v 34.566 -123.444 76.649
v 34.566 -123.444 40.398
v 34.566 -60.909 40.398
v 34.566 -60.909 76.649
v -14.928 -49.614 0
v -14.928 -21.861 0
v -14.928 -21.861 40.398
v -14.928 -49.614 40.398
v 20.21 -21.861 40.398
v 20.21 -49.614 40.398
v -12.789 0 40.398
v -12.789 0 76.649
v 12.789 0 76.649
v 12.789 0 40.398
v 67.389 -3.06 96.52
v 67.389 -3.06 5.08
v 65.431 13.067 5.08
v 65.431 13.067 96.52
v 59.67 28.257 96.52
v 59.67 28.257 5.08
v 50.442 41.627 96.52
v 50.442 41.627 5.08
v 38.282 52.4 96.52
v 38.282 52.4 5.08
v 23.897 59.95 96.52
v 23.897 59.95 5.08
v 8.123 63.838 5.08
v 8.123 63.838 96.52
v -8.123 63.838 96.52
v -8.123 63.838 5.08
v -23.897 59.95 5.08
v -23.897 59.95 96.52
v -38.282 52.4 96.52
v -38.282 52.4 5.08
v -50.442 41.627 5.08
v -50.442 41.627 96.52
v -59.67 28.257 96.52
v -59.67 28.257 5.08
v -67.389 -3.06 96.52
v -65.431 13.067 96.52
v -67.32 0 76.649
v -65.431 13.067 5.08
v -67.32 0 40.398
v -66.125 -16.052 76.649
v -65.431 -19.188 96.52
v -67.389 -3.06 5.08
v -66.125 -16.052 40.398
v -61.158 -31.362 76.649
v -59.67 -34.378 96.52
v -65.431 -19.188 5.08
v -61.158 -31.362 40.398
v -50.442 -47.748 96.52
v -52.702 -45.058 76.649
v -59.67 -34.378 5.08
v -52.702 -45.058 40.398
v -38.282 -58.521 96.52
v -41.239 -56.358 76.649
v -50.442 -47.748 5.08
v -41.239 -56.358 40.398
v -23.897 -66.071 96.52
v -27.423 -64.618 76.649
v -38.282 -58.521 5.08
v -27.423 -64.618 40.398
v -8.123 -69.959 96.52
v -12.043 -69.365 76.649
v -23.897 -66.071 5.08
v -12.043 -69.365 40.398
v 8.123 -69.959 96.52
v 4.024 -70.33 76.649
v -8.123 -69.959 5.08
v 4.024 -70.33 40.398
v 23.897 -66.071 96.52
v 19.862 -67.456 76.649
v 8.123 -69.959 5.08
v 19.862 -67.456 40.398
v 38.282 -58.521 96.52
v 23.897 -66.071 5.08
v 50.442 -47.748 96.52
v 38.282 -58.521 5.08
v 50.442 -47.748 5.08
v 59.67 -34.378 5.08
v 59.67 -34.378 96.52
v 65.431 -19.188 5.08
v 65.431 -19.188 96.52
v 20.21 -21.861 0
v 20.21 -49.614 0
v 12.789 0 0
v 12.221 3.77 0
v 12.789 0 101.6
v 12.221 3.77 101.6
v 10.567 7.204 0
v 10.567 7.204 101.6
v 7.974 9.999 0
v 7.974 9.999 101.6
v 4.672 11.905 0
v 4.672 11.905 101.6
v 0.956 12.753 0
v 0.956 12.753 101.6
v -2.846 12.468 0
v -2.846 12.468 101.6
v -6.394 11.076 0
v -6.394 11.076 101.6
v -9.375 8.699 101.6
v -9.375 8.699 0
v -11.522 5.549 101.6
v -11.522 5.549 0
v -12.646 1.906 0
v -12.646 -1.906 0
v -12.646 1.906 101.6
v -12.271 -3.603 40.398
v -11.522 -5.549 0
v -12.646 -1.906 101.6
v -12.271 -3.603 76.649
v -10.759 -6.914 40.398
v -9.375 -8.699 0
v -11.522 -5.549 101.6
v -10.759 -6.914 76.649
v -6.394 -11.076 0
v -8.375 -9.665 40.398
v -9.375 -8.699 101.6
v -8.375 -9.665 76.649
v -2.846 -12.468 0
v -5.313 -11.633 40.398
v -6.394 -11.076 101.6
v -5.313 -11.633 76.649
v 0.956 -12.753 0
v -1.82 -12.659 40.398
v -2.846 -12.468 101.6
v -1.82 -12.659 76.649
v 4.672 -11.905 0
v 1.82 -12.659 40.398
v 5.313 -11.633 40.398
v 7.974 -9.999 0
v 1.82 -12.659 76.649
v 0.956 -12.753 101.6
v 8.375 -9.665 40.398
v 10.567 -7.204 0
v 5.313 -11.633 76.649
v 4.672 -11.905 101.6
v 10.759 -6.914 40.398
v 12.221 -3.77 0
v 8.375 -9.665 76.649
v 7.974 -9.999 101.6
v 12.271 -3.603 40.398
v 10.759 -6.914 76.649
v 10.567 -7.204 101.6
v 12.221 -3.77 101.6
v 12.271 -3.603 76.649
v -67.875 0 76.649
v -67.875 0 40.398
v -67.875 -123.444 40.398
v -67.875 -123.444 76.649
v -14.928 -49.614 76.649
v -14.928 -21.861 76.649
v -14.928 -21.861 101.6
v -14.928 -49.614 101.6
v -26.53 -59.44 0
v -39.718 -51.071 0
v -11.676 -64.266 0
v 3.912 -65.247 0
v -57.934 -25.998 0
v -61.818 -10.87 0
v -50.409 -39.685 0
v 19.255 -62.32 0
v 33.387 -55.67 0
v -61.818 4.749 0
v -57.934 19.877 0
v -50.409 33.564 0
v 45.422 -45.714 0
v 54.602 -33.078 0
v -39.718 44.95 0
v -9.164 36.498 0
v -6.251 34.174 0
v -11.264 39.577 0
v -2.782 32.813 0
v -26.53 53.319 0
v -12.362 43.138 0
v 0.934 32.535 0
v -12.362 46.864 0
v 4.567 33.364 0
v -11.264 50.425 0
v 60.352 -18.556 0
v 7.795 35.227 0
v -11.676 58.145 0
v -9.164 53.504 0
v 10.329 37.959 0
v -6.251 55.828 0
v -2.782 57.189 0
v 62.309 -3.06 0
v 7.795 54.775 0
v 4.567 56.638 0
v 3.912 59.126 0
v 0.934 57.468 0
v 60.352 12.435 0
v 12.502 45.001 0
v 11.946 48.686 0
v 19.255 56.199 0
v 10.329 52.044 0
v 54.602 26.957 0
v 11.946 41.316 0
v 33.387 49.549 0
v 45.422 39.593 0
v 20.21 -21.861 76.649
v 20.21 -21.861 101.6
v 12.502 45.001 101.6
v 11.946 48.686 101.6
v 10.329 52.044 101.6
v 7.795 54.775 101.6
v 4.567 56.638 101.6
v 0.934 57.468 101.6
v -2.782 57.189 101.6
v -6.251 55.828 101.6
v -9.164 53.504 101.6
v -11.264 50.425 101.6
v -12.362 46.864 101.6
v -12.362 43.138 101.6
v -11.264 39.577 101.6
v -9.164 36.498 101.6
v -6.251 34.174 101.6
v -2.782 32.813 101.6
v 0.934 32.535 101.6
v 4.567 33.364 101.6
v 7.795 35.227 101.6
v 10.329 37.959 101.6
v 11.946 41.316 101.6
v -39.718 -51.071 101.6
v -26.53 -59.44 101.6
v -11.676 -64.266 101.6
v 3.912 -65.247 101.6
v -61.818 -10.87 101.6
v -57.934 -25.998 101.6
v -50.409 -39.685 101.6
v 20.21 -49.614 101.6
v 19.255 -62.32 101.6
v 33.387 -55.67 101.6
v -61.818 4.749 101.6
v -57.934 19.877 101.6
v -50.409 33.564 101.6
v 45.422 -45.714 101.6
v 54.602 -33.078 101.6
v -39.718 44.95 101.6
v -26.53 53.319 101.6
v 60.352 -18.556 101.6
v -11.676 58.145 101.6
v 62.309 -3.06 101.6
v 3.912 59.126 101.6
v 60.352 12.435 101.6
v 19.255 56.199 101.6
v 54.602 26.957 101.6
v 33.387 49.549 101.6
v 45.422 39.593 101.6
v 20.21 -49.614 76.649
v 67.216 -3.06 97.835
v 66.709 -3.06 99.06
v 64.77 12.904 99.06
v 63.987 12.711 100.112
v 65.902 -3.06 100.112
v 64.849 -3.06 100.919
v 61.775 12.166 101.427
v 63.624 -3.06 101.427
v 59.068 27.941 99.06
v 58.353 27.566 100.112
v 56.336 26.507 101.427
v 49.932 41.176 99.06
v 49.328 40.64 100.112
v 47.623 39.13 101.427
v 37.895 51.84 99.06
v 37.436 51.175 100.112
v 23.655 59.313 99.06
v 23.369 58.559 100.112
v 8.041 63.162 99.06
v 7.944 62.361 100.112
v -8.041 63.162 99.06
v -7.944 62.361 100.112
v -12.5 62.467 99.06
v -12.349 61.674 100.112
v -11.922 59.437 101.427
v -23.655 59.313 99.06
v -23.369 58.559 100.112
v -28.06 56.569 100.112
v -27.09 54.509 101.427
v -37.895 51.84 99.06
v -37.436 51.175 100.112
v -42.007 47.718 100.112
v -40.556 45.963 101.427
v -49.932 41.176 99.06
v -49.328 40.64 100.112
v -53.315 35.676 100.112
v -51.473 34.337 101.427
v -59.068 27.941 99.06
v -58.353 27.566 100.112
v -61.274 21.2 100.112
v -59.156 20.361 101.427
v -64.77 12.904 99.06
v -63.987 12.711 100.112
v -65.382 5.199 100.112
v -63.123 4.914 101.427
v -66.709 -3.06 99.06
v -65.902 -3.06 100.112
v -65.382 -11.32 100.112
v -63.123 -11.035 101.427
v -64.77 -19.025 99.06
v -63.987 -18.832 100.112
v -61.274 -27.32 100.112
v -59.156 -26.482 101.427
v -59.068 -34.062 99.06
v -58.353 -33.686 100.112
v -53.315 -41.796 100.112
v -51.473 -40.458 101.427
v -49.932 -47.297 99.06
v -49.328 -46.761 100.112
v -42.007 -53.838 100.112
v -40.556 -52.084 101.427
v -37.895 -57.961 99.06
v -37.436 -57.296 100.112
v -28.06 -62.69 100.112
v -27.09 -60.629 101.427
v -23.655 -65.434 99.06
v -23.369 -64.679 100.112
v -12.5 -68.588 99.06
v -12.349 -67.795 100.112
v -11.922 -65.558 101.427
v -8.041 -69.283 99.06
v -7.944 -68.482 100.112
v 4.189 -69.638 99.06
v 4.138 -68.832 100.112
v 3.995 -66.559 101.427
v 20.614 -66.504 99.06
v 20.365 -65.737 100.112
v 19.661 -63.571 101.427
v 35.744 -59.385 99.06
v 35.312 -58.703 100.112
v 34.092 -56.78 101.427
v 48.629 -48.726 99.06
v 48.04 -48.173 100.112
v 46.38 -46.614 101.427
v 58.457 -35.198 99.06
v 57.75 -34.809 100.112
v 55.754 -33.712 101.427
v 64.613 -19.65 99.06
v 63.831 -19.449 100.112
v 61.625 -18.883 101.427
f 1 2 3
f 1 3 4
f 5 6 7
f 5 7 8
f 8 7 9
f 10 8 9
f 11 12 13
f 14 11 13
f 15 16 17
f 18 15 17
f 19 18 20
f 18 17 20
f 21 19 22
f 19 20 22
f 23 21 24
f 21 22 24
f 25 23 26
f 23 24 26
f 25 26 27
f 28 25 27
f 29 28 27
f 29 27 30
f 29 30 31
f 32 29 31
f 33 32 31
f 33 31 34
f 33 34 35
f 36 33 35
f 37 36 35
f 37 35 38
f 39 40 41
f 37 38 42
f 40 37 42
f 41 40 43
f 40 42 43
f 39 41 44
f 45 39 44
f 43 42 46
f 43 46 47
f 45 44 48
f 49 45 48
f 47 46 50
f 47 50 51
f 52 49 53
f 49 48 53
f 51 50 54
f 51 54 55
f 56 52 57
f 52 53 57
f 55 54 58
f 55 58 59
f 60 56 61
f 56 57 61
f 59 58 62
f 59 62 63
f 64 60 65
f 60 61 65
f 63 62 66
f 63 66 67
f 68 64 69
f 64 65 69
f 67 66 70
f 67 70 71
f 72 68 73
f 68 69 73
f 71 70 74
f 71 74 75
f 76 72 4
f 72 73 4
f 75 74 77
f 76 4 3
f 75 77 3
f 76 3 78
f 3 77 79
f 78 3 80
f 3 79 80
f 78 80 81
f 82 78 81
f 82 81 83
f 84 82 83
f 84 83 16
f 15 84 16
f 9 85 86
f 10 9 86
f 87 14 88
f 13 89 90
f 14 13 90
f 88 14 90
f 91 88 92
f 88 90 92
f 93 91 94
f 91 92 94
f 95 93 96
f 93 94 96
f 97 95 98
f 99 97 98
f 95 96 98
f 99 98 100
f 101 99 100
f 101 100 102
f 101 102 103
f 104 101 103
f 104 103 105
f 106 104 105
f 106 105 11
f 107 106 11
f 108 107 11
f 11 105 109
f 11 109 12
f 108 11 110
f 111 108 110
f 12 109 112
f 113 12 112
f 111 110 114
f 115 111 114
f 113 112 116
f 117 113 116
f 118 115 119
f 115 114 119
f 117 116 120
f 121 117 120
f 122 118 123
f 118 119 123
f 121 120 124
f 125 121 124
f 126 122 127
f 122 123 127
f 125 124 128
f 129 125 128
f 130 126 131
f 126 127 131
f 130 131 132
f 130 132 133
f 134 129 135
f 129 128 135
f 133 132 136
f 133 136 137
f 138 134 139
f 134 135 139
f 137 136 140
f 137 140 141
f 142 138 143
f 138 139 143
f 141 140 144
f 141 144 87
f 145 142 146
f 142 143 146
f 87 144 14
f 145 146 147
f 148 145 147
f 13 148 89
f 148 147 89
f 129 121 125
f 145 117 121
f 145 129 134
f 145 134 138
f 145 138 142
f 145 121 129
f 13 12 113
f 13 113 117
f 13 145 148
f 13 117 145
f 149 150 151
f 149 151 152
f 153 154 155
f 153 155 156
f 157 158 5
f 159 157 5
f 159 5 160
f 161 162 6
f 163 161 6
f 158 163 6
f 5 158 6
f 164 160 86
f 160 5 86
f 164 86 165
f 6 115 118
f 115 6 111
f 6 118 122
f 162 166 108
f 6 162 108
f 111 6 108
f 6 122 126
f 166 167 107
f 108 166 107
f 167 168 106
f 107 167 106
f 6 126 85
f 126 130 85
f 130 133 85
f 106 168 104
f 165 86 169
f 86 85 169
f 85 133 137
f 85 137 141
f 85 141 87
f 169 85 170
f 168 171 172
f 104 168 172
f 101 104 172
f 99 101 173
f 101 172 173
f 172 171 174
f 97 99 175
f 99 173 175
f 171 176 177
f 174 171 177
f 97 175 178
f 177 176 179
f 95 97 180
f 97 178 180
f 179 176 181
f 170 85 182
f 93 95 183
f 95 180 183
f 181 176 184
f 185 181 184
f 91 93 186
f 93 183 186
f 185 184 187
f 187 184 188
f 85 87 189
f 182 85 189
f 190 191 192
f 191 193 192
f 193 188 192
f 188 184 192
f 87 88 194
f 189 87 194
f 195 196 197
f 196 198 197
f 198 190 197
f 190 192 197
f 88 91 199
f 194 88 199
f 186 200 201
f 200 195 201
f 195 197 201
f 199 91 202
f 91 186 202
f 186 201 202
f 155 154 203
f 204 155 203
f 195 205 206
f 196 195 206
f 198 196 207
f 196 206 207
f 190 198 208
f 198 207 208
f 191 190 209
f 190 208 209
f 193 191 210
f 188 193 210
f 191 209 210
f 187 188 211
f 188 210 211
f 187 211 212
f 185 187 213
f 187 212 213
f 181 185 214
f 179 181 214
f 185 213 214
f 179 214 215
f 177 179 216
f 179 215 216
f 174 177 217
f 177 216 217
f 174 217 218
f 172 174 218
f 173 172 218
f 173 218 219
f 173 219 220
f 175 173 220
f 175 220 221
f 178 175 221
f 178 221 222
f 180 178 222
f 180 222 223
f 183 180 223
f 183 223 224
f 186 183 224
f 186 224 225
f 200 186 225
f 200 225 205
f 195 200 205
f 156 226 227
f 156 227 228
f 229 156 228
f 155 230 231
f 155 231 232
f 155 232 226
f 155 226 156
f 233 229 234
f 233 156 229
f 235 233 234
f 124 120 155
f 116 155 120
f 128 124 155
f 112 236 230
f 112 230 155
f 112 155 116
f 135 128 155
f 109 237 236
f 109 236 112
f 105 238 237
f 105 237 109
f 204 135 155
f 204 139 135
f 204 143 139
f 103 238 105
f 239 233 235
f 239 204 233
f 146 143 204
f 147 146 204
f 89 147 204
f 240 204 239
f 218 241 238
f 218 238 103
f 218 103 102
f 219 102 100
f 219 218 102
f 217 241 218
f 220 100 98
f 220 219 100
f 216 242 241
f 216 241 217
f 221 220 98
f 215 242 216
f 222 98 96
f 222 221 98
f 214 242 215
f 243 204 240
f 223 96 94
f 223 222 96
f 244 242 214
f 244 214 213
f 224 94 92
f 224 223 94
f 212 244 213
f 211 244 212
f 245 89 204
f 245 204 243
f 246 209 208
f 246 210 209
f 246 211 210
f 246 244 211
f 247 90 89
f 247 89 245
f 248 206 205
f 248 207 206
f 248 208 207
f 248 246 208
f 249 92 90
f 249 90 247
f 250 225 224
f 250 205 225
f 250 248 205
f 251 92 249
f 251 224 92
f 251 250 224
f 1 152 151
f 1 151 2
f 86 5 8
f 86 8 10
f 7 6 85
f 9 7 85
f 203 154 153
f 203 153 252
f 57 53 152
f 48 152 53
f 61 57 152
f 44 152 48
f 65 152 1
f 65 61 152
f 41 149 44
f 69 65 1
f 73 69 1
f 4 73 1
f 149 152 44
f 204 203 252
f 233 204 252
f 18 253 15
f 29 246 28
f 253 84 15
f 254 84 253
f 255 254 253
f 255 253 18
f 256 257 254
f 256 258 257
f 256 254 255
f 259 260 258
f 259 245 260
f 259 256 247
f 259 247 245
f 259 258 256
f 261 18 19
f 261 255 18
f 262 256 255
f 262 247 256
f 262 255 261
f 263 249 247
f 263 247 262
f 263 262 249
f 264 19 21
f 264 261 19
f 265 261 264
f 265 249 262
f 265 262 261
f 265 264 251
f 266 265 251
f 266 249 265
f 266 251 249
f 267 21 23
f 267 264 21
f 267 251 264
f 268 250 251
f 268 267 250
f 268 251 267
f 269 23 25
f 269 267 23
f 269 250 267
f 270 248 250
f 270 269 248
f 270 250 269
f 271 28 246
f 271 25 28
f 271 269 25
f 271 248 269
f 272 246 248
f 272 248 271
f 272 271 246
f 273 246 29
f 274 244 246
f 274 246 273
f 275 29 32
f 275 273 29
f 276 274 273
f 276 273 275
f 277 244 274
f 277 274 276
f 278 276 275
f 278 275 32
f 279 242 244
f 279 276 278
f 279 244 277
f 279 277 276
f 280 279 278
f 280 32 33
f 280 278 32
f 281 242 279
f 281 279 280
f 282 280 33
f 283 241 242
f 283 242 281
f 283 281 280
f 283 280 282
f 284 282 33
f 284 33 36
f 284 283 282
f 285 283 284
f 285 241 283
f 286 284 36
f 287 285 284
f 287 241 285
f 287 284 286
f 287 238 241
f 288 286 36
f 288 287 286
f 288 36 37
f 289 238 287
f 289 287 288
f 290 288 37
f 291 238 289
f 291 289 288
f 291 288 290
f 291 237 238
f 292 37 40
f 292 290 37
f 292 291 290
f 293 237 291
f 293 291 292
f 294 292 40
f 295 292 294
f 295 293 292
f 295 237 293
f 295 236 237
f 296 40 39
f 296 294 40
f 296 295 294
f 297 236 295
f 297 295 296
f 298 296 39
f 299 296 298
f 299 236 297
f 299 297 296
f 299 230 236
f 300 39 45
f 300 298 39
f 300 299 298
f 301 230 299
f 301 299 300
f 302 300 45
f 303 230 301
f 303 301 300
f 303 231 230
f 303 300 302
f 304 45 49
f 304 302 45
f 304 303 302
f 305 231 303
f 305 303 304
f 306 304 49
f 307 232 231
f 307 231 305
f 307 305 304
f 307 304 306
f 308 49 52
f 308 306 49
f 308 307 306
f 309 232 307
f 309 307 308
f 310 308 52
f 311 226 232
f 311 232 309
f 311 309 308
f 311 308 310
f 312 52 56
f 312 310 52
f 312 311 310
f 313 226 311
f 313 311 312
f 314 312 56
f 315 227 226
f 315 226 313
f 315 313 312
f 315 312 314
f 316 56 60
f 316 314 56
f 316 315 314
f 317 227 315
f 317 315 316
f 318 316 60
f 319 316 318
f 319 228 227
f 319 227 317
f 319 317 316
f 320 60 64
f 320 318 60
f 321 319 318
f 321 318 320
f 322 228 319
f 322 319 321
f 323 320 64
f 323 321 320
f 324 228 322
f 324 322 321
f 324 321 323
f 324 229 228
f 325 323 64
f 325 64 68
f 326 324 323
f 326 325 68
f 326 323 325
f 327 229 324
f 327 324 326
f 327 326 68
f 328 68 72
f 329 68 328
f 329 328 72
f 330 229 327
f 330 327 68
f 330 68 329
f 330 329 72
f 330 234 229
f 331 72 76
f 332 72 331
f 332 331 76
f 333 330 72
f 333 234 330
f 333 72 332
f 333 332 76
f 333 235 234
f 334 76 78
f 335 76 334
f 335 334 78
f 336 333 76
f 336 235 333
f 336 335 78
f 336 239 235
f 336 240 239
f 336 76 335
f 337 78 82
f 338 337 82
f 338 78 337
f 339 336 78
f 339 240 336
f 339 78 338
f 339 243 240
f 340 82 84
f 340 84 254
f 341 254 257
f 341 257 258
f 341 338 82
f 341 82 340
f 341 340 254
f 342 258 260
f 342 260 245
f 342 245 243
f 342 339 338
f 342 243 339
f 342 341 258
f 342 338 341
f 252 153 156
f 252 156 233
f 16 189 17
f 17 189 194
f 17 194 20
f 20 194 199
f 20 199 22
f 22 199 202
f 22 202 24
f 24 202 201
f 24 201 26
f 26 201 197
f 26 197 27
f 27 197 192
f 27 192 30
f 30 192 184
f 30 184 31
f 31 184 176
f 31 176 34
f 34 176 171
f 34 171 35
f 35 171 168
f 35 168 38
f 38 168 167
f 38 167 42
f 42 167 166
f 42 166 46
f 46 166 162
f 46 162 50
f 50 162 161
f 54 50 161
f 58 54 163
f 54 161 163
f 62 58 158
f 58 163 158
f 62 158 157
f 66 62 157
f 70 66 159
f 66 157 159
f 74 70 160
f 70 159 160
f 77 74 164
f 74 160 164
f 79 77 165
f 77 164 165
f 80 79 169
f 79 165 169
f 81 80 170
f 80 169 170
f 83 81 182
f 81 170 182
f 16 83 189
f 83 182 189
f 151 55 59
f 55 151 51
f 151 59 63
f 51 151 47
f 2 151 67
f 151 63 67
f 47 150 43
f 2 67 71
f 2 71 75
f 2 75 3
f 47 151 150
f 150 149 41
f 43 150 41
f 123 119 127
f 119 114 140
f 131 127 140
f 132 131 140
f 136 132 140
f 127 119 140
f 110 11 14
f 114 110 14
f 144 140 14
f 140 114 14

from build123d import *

# Parameters (mm, degrees)
F0_R      = 67.389458
F1_DEPTH  = 101.6
F2_R      = 12.788908
F3_DEPTH  = 161.798
F4_R      = 12.50156
F5_DEPTH  = 121.666
F6_R      = 5.08
F7_SIZE   = 5.08
F8_W      = 35.13822
F8_H      = 27.752711
F9_DEPTH  = 223.266
F10_W     = 102.441065
F10_H     = 36.250696
F11_DEPTH = 25.4
F12_DEPTH = 123.444


with BuildPart() as f1:
    # F0 (on Top) → F1 (new body)
    with BuildSketch(Plane.XY):
        with Locations((0, -3.060437)):
            Circle(F0_R)
    extrude(amount=F1_DEPTH)

    # F2 (on face) → F3 (cut)
    with BuildSketch(Plane.XY.offset(101.6)):
        Circle(F2_R)
    extrude(amount=-F3_DEPTH, mode=Mode.SUBTRACT)

    # F4 (on face) → F5 (cut)
    with BuildSketch(Plane.XY.offset(101.6)):
        with Locations((0, 45.001123)):
            Circle(F4_R)
    extrude(amount=-F5_DEPTH, mode=Mode.SUBTRACT)

    # F6
    f6_edges = [f1.edges().sort_by_distance(p)[0] for p in [
        (-67.389458, -3.060437, 101.6),
    ]]
    fillet(f6_edges, radius=F6_R)

    # F7
    f7_edges = [f1.edges().sort_by_distance(p)[0] for p in [
        (-67.389458, -3.060437, 0),
    ]]
    chamfer(f7_edges, length=F7_SIZE)

    # F8 (on face) → F9 (cut)
    with BuildSketch(Plane(origin=(0, 0, 0), x_dir=(1, 0, 0), z_dir=(0, 0, -1))):
        with Locations((2.640987, 35.737217)):
            Rectangle(F8_W, F8_H)
    extrude(amount=-F9_DEPTH, mode=Mode.SUBTRACT)

    # F10 (on Front) → F11 (join)
    with BuildSketch(Plane.XZ):
        with Locations((-16.654189, 58.523156)):
            Rectangle(F10_W, F10_H)
    extrude(amount=F11_DEPTH)

    # F10 (on Front) → F12 (join)
    with BuildSketch(Plane.XZ):
        with Locations((-16.654189, 58.523156)):
            Rectangle(F10_W, F10_H)
    extrude(amount=F12_DEPTH)


solid = f1.part
